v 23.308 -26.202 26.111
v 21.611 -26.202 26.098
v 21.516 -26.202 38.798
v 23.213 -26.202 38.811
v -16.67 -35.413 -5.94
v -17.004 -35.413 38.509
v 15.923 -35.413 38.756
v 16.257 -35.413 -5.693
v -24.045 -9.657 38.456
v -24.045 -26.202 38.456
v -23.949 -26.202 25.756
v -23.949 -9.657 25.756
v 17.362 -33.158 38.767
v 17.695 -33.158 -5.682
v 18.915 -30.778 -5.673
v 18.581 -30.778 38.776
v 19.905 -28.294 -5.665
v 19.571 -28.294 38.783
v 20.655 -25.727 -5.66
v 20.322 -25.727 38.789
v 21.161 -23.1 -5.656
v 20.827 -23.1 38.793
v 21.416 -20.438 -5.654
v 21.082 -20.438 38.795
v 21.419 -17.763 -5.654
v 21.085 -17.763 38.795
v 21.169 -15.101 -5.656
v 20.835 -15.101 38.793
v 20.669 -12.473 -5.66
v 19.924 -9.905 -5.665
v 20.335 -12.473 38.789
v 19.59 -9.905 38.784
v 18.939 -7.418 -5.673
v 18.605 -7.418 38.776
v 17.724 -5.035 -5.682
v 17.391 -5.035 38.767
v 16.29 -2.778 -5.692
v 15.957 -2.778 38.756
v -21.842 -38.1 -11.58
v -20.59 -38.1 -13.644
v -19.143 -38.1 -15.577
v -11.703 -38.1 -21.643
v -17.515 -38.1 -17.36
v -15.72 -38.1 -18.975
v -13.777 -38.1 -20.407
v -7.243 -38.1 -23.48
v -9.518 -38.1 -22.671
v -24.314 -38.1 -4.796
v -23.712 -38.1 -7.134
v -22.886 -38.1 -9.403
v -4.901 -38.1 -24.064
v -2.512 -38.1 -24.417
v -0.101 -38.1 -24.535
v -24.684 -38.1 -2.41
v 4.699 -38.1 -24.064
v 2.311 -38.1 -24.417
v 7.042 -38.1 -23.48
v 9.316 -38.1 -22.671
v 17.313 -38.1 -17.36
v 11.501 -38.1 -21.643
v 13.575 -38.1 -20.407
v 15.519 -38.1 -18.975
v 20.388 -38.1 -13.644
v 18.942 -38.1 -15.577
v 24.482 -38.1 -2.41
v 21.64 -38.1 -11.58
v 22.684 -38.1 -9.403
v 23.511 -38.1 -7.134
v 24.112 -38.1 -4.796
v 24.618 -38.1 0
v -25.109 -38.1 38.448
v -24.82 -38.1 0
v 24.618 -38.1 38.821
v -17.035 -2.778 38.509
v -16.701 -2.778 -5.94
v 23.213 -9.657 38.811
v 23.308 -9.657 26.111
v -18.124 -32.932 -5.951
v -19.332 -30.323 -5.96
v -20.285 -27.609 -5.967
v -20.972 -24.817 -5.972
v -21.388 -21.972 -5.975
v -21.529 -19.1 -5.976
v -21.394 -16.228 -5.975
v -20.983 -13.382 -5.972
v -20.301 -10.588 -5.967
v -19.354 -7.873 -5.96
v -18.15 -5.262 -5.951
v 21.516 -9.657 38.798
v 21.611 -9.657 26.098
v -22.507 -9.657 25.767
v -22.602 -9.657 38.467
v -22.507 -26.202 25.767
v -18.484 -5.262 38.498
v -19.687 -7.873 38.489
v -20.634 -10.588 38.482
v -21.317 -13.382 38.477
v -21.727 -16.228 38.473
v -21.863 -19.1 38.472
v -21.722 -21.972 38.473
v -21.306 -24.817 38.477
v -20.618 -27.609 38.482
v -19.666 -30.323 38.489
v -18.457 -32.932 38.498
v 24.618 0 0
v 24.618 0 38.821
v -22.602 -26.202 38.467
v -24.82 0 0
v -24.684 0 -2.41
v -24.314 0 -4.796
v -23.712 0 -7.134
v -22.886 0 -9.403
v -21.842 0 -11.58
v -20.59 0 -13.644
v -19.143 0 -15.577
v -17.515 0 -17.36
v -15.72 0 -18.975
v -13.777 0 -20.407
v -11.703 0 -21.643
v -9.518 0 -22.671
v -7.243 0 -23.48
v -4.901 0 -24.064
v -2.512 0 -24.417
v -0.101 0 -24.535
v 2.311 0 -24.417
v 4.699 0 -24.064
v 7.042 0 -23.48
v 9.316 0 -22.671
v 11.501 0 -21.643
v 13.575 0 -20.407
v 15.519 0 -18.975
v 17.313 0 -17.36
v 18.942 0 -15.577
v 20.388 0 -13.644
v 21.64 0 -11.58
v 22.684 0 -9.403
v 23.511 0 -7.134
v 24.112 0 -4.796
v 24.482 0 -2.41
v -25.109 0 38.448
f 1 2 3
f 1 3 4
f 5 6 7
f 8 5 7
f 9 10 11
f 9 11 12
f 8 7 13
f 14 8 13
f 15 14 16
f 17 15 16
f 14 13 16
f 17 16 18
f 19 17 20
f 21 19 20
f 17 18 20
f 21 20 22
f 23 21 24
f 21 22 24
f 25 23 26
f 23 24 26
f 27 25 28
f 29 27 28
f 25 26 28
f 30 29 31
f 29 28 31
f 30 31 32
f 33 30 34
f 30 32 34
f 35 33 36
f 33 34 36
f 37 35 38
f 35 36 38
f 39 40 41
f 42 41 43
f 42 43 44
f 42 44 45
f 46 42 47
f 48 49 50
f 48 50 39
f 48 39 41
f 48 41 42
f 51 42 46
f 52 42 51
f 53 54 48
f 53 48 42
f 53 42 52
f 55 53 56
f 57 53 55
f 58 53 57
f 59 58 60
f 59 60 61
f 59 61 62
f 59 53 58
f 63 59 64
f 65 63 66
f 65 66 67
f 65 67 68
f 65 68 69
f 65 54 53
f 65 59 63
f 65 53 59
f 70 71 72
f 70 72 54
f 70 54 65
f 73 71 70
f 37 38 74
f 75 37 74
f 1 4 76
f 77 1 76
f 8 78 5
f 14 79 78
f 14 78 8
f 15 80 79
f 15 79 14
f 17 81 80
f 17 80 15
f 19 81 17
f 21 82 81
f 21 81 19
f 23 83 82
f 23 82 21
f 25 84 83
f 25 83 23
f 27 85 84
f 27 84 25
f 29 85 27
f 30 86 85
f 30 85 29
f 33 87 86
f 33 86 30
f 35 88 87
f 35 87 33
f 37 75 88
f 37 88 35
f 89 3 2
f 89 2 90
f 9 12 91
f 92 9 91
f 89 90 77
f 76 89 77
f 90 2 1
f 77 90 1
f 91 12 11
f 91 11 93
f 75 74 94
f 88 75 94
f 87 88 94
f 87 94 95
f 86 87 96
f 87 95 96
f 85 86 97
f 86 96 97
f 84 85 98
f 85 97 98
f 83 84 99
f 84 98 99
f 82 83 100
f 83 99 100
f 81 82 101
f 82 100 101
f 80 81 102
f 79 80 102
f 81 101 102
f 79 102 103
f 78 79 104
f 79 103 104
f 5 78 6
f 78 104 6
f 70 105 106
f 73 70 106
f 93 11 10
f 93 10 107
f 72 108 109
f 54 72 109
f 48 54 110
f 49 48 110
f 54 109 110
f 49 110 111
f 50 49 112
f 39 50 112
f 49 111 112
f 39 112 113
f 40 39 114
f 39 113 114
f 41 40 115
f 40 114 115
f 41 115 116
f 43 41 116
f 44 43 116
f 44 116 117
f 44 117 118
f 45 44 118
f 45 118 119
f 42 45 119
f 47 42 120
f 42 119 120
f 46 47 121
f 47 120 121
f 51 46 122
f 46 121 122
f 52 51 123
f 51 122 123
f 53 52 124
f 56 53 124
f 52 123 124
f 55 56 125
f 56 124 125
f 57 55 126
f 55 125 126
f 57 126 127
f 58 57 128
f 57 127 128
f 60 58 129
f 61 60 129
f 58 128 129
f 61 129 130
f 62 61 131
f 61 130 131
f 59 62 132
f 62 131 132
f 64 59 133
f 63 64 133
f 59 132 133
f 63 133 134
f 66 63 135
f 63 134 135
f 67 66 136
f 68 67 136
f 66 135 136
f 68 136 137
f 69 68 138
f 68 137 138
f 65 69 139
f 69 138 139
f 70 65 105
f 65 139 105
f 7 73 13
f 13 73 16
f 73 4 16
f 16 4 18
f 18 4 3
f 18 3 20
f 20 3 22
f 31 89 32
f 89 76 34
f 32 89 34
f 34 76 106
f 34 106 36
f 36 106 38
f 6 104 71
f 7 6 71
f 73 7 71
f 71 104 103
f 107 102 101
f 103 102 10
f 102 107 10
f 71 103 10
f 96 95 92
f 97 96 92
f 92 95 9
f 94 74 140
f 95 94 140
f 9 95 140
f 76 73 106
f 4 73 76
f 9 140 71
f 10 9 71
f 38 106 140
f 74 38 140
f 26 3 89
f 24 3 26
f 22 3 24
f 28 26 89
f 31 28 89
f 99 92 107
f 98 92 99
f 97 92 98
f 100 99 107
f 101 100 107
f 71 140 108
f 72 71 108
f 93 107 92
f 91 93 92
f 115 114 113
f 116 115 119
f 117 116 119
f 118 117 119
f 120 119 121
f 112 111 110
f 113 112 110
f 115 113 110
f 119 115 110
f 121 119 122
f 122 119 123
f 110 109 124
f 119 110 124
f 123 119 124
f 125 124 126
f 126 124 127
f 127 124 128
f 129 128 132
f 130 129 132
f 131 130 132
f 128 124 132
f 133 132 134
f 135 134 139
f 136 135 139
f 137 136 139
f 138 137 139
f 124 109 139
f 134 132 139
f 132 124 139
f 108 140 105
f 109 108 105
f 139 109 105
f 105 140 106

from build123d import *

# Parameters (mm, degrees)
F1_DEPTH = 38.1
F3_DEPTH = 44.45
F4_W     = 1.4423634857
F4_H     = 16.5442936122
F5_DEPTH = 12.7
F4_W_2   = 1.6968995333
F6_DEPTH = 12.7


with BuildPart() as f1:
    # F0 (on Front) → F1 (new body)
    with BuildSketch(Plane.XZ):
        with BuildLine():
            Line((-25.10883745, 38.448043143), (-24.820253253, 0))
            ThreePointArc((-24.820253253, 0), (-0.1008948311, -24.534515601), (24.6184635907, 0))
            Line((24.6184635907, 0), (24.6184635907, 38.8212874506))
            Line((24.6184635907, 38.8212874506), (-25.10883745, 38.448043143))
        make_face()
    extrude(amount=F1_DEPTH)

    # F2 (on face) → F3 (cut)
    with BuildSketch(Plane(origin=(-0.2899824262, 0, 38.6343290697), x_dir=(0.9999718325, 0, 0.0075056113), z_dir=(-0.0075056113, 0, 0.9999718325))):
        with BuildLine():
            Line((-16.7144715449, -35.4128060373), (16.2133492063, -35.4128060373))
            ThreePointArc((16.2133492063, -35.4128060373), (21.4057154297, -19.1007387378), (16.2469655347, -2.7780089998))
            Line((16.2469655347, -2.7780089998), (-16.7454987534, -2.7780089998))
            ThreePointArc((-16.7454987534, -2.7780089998), (-21.5733199015, -19.1000122708), (-16.7144715449, -35.4128060373))
        make_face()
    extrude(amount=-F3_DEPTH, mode=Mode.SUBTRACT)

    # F4 (on face) → F5 (cut)
    with BuildSketch(Plane(origin=(-0.2899824262, 0, 38.6343290697), x_dir=(0.9999718325, 0, 0.0075056113), z_dir=(-0.0075056113, 0, 0.9999718325))):
        with Locations((-23.0341581628, -17.9296452552)):
            Rectangle(F4_W, F4_H)
    extrude(amount=-F5_DEPTH, mode=Mode.SUBTRACT)

    # F4 (on face) → F6 (cut)
    with BuildSketch(Plane(origin=(-0.2899824262, 0, 38.6343290697), x_dir=(0.9999718325, 0, 0.0075056113), z_dir=(-0.0075056113, 0, 0.9999718325))):
        with Locations((-23.0341581628, -17.9296452552)):
            Rectangle(F4_W, F4_H)
        with Locations((22.6548295468, -17.9296452552)):
            Rectangle(F4_W_2, F4_H)
    extrude(amount=-F6_DEPTH, mode=Mode.SUBTRACT)


solid = f1.part
